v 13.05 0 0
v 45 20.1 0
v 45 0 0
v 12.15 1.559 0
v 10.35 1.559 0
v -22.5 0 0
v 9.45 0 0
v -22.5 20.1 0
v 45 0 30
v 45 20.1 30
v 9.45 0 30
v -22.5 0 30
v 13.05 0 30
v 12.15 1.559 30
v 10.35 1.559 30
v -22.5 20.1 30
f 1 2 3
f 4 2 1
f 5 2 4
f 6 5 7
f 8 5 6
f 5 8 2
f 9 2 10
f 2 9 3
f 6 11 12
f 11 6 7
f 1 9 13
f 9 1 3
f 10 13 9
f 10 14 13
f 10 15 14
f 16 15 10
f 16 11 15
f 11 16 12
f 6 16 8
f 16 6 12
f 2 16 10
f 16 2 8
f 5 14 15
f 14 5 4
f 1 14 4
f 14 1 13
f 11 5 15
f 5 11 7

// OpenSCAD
// Asymmetric-bbox regression fixture (issue #223, golden-a).
//
// Reconstructed from the real v15 model (project 32): the harvested STL's
// bounding box is x[-22.5, 45], y[0, 20.1], z[0, 30] — the silhouette is
// NOT symmetric about the origin, and the bbox does not touch the origin
// on the negative-x or +y sides. The front view (camera -Z) clips the
// right frame edge unless the per-model fit is correct.
//
// Polyhedron box with two M4-style through-holes; the holes leave the
// outer hull exactly the 67.5 × 20.1 × 30 box above (holes only remove
// interior material, the hull is unchanged).
difference() {
  polyhedron(
    points = [
      [-22.5, 0, 0], [45, 0, 0], [45, 20.1, 0], [-22.5, 20.1, 0],
      [-22.5, 0, 30], [45, 0, 30], [45, 20.1, 30], [-22.5, 20.1, 30]
    ],
    faces = [
      [0, 1, 2, 3], [4, 7, 6, 5], [0, 4, 5, 1], [1, 5, 6, 2], [2, 6, 7, 3], [3, 7, 4, 0]
    ]
  );
  translate([11.25, 0, 0])
    cylinder(h=31, d=3.6);
}
